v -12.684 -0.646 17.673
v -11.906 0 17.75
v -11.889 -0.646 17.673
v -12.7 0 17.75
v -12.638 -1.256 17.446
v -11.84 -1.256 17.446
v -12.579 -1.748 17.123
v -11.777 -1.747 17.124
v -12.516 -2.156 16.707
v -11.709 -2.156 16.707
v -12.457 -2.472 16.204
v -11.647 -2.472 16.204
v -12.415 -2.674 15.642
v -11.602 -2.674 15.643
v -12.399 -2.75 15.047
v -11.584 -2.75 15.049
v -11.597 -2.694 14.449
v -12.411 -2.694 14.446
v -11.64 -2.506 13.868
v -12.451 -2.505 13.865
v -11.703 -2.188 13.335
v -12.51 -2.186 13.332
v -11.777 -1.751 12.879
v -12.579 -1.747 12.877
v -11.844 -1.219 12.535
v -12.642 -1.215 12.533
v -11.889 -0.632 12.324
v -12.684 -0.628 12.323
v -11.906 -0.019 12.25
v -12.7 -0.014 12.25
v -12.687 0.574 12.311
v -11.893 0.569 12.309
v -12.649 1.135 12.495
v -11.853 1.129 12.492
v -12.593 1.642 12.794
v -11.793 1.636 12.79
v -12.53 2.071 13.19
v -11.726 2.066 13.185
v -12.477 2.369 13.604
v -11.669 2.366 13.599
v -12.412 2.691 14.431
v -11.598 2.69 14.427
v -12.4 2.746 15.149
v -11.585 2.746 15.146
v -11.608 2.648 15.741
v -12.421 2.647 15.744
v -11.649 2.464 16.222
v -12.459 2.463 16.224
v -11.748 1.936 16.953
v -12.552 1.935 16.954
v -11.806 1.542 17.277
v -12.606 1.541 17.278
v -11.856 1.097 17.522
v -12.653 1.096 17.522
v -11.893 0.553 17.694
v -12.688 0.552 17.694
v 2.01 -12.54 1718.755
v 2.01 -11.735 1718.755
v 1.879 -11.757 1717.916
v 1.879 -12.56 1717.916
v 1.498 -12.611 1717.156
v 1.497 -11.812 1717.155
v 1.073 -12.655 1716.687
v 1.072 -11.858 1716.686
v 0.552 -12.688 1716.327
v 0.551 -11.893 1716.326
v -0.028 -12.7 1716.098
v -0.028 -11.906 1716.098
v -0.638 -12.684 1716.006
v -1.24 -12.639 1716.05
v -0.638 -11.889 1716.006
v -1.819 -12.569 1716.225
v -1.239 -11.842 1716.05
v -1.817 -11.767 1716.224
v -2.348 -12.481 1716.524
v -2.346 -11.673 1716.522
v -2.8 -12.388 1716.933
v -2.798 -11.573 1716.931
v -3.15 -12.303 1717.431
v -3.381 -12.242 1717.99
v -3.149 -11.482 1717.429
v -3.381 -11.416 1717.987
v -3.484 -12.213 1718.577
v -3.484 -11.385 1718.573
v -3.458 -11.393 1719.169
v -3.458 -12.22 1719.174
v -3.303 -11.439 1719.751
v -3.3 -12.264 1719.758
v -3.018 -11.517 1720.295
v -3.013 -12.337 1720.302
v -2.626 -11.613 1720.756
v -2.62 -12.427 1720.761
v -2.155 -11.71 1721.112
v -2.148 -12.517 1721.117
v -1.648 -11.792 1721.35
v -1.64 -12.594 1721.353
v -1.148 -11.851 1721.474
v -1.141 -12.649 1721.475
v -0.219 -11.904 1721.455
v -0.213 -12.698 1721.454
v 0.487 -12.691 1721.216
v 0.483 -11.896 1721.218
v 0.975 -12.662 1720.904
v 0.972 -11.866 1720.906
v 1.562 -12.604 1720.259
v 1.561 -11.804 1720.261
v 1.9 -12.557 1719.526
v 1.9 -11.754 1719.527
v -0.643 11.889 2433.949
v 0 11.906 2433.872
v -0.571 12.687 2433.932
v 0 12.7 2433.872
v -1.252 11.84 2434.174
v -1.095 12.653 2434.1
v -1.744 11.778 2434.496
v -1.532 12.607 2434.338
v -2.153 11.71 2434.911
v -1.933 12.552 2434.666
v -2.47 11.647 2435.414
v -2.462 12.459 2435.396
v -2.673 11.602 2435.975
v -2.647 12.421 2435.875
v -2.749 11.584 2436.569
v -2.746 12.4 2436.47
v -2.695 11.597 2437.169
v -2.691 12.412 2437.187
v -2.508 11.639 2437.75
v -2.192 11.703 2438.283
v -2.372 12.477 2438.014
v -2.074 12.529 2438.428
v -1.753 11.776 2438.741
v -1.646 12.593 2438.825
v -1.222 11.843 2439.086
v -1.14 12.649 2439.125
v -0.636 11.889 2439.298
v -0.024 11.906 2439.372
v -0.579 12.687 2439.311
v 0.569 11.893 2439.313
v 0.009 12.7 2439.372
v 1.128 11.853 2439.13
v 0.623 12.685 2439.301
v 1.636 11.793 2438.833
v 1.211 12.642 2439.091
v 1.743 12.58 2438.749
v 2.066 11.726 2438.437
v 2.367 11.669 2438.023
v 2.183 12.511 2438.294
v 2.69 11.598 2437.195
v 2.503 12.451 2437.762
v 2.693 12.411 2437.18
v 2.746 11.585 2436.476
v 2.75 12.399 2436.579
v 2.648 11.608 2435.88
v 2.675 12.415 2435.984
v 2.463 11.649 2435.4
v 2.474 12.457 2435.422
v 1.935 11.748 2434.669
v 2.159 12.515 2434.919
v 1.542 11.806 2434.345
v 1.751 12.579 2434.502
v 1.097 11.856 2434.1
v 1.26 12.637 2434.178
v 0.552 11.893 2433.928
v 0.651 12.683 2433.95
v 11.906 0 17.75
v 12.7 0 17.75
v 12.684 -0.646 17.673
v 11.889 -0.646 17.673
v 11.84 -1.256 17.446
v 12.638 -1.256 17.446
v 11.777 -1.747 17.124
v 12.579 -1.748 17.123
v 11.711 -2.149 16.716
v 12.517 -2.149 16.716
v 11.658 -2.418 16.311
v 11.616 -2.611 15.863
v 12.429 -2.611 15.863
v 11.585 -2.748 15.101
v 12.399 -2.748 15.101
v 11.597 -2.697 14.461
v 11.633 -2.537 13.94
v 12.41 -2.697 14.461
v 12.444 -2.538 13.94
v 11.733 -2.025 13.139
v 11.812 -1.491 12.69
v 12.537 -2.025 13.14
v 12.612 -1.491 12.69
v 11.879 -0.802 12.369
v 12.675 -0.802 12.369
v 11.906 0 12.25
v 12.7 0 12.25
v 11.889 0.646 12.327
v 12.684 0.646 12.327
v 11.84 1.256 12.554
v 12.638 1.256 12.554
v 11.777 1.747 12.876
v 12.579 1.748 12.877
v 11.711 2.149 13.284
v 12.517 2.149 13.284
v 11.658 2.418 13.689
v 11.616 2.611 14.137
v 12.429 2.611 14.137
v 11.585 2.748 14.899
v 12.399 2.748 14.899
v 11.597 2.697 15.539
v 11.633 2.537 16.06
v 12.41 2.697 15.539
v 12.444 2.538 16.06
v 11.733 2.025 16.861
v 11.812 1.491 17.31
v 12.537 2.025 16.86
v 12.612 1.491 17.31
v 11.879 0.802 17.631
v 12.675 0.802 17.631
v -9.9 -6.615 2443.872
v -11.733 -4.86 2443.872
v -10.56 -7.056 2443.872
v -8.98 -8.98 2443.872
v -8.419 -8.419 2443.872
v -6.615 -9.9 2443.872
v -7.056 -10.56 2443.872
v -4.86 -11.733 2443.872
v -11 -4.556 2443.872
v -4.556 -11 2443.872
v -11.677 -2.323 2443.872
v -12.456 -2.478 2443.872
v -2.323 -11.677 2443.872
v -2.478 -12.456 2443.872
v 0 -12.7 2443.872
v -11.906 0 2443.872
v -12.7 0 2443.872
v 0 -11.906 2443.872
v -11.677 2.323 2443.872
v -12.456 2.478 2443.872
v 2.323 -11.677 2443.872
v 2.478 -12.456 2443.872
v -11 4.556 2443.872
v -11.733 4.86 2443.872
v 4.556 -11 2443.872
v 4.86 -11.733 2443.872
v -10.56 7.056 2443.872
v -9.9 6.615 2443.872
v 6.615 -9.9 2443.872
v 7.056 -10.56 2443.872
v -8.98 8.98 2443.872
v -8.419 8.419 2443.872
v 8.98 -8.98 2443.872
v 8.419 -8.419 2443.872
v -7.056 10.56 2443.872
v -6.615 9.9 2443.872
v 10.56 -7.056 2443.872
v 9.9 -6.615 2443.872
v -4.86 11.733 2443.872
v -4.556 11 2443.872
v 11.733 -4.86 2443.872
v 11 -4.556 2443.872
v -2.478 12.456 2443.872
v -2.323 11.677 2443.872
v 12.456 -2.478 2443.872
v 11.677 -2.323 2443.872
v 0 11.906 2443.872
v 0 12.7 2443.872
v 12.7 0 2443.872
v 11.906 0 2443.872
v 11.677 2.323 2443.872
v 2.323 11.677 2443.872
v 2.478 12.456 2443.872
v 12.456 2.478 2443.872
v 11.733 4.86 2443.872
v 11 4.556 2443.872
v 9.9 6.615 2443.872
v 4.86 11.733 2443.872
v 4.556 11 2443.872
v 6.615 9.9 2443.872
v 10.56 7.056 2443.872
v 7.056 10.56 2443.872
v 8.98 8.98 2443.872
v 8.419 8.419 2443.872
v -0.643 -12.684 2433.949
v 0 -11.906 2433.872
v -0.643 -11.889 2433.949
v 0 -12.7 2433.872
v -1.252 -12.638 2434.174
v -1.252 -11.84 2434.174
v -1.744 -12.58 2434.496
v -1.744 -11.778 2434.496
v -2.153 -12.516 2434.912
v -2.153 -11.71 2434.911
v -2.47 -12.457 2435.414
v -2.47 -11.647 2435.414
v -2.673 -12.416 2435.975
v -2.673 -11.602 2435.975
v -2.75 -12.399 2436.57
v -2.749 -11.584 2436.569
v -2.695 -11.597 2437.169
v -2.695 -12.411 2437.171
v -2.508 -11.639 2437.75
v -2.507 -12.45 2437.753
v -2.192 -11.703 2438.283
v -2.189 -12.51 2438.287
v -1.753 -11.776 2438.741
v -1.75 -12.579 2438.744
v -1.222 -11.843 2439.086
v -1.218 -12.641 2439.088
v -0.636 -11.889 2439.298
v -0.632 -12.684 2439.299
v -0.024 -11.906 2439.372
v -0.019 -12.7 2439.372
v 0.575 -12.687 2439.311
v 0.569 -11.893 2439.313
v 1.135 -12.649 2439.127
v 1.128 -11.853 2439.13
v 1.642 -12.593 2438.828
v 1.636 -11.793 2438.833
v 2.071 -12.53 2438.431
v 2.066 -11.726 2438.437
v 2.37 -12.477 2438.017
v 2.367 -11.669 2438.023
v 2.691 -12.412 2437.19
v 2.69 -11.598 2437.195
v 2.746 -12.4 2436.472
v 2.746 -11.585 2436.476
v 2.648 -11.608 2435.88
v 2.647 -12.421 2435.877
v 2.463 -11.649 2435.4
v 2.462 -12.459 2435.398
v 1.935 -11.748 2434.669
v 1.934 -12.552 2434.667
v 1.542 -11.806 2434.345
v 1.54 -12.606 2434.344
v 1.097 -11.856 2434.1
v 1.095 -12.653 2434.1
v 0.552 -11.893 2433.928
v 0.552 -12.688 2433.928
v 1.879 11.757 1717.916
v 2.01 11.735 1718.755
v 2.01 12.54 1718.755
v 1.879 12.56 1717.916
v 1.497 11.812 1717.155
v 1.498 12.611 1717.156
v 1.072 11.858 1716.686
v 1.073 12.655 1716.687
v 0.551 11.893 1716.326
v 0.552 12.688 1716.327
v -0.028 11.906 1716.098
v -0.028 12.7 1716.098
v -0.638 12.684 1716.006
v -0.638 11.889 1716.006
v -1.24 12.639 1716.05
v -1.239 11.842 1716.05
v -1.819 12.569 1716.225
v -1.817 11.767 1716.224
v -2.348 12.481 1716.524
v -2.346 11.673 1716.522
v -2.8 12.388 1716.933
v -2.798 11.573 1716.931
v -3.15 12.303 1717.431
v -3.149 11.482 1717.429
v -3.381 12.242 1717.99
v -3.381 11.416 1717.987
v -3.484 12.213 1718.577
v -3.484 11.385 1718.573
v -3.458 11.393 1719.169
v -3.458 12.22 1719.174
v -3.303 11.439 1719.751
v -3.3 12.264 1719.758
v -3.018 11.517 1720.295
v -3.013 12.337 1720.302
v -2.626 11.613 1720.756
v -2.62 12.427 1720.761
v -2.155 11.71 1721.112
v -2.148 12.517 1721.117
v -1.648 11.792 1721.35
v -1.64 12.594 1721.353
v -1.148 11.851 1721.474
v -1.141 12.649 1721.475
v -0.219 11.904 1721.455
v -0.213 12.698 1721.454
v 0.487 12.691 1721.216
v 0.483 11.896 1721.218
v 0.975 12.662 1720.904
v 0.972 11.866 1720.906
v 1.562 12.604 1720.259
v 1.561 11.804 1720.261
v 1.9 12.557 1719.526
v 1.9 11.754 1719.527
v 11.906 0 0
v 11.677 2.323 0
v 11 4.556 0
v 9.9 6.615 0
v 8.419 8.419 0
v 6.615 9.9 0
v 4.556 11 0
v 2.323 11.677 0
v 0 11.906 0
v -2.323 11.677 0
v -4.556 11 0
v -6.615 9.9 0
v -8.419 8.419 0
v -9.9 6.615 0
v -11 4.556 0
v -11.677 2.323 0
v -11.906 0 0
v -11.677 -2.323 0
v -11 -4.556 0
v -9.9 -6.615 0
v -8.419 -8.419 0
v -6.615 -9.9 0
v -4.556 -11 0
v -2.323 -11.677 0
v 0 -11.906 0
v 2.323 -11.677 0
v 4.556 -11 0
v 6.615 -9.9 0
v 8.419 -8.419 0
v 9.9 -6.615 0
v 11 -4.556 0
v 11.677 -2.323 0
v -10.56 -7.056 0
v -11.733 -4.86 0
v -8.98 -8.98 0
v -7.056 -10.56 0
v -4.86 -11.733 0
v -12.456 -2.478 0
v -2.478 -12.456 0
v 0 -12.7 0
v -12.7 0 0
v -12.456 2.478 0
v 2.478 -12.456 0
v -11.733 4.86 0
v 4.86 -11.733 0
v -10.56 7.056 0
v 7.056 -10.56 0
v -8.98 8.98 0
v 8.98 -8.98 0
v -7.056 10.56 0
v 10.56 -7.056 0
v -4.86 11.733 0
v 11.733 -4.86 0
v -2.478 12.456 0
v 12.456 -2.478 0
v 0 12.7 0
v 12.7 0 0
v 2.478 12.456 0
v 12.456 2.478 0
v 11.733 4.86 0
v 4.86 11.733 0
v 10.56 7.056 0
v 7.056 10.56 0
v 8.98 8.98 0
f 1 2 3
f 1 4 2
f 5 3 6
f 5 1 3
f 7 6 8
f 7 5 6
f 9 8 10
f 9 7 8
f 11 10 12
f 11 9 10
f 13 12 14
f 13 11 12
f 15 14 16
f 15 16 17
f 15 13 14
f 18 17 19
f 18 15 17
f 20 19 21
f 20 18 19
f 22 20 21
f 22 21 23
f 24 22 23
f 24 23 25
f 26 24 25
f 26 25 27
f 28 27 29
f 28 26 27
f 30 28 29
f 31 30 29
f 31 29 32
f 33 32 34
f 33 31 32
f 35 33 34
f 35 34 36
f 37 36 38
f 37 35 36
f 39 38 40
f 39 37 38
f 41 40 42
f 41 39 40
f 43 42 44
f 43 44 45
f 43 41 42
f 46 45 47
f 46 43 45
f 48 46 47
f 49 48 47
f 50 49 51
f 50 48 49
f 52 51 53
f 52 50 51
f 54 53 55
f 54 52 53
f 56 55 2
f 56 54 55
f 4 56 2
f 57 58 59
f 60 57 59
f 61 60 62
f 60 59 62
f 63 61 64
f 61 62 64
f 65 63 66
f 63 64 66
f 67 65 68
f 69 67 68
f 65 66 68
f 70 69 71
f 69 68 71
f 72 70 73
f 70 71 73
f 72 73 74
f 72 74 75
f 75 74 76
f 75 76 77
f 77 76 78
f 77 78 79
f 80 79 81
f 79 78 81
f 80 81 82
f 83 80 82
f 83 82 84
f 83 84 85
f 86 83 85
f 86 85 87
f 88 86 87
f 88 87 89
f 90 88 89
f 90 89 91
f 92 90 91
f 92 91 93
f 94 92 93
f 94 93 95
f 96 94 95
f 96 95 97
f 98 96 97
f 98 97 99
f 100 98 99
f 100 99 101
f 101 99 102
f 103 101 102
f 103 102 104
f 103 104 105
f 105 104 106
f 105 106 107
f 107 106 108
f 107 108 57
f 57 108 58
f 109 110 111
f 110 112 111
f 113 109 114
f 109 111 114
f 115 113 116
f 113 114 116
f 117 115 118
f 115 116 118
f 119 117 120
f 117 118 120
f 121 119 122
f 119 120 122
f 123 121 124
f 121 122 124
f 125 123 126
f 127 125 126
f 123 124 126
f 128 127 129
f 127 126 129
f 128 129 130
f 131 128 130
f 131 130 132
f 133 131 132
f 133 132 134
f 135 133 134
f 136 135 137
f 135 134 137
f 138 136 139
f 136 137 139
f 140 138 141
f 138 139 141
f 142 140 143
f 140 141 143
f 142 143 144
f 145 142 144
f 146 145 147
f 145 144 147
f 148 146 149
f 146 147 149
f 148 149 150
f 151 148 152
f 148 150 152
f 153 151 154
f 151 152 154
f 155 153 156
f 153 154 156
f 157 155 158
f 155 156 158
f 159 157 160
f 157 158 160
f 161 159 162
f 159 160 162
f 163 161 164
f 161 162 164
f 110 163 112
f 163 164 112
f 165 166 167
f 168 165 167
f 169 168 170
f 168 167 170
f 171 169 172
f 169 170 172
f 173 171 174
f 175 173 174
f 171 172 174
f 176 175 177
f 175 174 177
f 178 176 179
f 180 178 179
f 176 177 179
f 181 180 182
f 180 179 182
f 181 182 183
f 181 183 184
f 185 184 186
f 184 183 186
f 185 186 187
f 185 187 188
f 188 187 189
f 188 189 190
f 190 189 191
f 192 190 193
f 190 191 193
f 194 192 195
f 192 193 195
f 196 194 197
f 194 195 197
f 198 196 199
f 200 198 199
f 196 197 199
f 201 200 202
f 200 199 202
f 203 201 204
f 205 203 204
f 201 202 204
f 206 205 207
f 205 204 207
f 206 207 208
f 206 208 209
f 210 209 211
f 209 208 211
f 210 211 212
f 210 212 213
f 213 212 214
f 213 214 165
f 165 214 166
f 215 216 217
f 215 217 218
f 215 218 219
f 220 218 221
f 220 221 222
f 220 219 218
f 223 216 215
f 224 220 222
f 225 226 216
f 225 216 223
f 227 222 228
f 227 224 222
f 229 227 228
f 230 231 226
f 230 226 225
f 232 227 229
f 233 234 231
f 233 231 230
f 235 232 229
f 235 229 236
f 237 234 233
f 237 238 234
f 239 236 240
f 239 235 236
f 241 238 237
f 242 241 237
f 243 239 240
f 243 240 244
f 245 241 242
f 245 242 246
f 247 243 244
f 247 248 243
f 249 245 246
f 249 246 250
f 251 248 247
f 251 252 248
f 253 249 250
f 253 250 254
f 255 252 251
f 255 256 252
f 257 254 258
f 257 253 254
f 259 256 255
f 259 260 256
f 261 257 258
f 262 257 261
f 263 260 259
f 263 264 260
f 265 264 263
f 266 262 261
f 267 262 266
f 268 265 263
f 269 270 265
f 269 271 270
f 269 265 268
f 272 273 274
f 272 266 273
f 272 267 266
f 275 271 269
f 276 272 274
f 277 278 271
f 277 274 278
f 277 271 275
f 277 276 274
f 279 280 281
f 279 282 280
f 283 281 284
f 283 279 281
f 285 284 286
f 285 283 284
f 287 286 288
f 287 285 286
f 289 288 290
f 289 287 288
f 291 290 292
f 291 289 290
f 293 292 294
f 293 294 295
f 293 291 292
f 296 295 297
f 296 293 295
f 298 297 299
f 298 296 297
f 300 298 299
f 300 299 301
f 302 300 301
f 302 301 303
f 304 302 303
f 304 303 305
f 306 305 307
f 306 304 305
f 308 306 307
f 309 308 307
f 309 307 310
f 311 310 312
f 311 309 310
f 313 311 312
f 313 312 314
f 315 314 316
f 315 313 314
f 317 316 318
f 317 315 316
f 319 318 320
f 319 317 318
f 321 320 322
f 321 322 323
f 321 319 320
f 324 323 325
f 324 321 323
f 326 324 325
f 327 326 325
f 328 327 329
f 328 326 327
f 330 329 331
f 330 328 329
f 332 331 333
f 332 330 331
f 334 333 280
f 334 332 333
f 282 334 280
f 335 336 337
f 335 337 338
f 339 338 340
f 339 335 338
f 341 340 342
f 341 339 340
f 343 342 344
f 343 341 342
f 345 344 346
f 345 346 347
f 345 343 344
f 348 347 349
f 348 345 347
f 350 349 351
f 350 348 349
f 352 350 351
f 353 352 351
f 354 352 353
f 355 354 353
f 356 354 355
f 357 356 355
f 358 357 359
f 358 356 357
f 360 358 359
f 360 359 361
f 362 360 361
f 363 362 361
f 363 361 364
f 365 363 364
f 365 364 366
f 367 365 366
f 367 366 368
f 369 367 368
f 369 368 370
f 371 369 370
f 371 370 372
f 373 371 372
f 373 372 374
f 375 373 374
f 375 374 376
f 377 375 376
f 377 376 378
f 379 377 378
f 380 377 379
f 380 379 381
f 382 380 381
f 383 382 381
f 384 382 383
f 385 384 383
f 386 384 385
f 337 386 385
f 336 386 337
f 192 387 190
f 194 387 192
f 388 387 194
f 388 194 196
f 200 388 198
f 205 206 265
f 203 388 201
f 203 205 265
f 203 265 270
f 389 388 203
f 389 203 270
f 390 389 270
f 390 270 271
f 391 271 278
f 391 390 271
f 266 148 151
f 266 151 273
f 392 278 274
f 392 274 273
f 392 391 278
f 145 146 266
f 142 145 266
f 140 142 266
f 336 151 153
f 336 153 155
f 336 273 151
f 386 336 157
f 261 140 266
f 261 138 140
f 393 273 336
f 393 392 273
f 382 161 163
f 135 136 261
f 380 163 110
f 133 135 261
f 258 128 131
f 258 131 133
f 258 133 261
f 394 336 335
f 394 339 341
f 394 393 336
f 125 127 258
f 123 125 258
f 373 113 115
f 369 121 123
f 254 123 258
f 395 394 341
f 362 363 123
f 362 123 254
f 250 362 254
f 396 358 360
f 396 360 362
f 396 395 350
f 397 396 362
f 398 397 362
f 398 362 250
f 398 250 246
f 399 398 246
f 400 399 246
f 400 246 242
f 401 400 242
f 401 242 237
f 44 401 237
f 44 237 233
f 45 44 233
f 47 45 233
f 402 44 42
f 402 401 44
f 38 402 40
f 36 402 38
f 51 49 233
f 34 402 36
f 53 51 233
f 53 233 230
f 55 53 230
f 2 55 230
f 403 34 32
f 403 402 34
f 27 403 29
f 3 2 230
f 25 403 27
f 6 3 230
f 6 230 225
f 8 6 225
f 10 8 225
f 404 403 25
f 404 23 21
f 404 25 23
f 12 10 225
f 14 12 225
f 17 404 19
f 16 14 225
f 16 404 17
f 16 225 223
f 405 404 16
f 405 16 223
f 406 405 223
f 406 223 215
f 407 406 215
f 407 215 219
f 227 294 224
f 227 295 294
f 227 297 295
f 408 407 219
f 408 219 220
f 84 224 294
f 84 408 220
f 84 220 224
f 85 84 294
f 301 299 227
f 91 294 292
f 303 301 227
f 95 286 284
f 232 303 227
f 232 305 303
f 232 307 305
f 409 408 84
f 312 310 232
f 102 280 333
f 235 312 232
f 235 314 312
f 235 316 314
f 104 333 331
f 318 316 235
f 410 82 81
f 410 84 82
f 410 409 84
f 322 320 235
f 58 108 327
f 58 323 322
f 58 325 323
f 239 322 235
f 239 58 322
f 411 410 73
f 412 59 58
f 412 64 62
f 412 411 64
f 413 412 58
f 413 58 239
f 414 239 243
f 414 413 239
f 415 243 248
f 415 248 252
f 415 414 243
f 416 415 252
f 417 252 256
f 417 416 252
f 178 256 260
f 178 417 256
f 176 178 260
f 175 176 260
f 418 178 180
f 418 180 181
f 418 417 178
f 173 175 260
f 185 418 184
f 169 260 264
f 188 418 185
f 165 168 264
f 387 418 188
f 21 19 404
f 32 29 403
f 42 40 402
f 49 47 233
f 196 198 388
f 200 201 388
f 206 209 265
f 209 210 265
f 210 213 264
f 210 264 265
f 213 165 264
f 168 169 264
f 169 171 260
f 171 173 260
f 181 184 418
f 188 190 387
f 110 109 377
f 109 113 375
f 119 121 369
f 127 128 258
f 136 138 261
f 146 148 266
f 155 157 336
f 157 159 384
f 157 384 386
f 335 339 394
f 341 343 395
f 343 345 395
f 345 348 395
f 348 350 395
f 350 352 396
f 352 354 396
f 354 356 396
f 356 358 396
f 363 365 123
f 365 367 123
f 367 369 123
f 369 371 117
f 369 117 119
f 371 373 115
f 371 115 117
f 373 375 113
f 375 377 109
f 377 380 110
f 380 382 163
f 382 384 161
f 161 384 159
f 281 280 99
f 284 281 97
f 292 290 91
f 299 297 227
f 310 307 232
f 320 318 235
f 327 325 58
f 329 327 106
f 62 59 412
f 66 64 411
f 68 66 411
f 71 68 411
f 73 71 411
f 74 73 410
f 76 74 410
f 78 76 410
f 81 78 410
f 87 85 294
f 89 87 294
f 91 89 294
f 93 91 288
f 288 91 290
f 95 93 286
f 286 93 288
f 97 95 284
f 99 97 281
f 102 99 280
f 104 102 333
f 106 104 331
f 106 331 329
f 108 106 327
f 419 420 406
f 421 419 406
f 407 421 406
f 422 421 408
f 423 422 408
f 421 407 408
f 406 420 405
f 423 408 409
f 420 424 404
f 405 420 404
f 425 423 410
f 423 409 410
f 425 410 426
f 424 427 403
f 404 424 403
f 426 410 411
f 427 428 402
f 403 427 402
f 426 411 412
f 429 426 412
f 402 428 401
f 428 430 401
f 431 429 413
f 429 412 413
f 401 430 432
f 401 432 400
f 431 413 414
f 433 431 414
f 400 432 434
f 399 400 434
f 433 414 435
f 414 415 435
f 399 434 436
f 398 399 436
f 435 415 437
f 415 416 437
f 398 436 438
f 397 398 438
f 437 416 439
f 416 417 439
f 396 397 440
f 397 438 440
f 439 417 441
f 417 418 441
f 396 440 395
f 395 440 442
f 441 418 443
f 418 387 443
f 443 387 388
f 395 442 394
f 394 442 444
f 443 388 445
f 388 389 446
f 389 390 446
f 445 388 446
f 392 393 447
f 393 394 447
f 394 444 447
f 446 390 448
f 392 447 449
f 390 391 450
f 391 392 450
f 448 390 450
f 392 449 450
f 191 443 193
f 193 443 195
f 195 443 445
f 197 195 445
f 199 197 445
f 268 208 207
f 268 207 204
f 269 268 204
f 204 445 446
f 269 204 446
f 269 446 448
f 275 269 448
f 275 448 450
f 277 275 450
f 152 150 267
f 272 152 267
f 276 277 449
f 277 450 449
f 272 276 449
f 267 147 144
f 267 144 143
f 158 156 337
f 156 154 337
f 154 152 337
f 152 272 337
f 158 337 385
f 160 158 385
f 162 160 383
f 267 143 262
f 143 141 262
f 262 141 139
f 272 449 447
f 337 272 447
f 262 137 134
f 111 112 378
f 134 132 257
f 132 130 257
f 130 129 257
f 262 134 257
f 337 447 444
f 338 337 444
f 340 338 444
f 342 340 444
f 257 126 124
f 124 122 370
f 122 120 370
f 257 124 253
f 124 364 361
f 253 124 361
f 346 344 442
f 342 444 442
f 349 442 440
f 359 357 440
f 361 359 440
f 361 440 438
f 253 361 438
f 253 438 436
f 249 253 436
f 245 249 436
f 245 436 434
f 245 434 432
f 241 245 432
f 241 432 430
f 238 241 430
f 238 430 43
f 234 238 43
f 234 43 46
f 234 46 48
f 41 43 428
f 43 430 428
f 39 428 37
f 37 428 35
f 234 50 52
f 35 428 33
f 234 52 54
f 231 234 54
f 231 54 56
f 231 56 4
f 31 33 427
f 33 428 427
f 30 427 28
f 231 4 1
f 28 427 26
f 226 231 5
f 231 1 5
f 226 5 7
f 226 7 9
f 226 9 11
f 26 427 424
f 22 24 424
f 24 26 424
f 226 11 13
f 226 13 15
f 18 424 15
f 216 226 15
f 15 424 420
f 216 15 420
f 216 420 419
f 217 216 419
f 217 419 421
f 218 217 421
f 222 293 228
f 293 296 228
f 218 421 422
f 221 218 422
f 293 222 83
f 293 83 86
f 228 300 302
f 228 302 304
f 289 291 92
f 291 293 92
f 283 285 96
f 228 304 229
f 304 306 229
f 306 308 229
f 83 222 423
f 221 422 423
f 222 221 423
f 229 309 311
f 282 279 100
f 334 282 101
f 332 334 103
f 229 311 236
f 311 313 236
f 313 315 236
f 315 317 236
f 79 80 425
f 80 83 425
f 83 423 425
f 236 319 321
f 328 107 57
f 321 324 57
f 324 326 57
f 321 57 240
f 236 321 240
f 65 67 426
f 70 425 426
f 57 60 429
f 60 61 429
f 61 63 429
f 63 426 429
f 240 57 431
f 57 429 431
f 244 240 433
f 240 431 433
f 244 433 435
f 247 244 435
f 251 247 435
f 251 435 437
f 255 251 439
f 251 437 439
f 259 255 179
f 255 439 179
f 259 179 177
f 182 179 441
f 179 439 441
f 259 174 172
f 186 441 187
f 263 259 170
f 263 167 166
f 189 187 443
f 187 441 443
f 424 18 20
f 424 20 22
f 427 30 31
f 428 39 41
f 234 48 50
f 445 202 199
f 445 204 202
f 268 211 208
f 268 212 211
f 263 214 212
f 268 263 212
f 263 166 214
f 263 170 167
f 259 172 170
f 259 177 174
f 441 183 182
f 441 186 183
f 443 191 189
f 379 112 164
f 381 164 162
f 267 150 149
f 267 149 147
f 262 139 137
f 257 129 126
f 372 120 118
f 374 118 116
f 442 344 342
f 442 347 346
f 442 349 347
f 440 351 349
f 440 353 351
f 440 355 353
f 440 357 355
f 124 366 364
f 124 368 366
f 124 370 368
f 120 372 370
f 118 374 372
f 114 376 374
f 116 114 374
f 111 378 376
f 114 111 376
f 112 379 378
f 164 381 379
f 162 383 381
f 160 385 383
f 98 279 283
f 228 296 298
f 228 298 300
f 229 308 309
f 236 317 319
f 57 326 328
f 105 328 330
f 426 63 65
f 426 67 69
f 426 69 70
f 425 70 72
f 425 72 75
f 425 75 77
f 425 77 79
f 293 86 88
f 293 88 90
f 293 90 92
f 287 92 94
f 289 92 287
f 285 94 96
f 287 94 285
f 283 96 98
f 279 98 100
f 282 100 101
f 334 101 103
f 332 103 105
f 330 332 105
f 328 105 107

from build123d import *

# Parameters (mm, degrees)
SKETCH1_R               = 12.7
SKETCH1_R_2             = 11.90625
BOSS_EXTRUDE1_DEPTH     = 2443.872227937
SKETCH4_W               = 2.75
SKETCH4_H               = 12.7
SKETCH12_W              = 2.75
SKETCH12_H              = 12.7
SKETCH13_R              = 2.750000003
CUT_EXTRUDE1_DEPTH      = 13.7000001
CUT_EXTRUDE1_DEPTH_BACK = 13.7000001


with BuildPart() as part:
    # Sketch1 → Boss-Extrude1 (new body)
    with BuildSketch(Plane.XY):
        Circle(SKETCH1_R)
        Circle(SKETCH1_R_2, mode=Mode.SUBTRACT)
    extrude(amount=BOSS_EXTRUDE1_DEPTH)

    # Sketch4 → M5 Clearance Hole1 (revolve, cut)
    with BuildSketch(Plane(origin=(0, 0, 2436.622227937), x_dir=(0, 0, -1), z_dir=(1, 0, 0))):
        with Locations((1.375, 6.35)):
            Rectangle(SKETCH4_W, SKETCH4_H)
    m5_clearance_hole1 = revolve(axis=Axis((0, -6.35, 2436.622227937), (0, 1, 0)), mode=Mode.SUBTRACT)

    # Mirror1: M5 Clearance Hole1 across plane
    add(m5_clearance_hole1.mirror(Plane.ZX), mode=Mode.SUBTRACT)

    # Sketch12 → M5 Clearance Hole3 (revolve, cut)
    with BuildSketch(Plane(origin=(0, 0, 15), x_dir=(0, 0, 1), z_dir=(0, 1, 0))):
        with Locations((1.375, 6.35)):
            Rectangle(SKETCH12_W, SKETCH12_H)
    m5_clearance_hole3 = revolve(axis=Axis((-6.35, 0, 15), (1, 0, 0)), mode=Mode.SUBTRACT)

    # Mirror3: M5 Clearance Hole3 across plane
    add(m5_clearance_hole3.mirror(Plane(origin=(0, 0, 0), x_dir=(0, 0, 1), z_dir=(1, 0, 0))), mode=Mode.SUBTRACT)

    # Sketch13 → Cut-Extrude1 (cut, two sides)
    with BuildSketch(Plane(origin=(0, 0, 0), x_dir=(1, 0, 0), z_dir=(0, 1, 0))) as cut_extrude1_sk:
        with Locations((-0.739798723, -1718.754532743)):
            Circle(SKETCH13_R)
    extrude(amount=CUT_EXTRUDE1_DEPTH, mode=Mode.SUBTRACT)
    extrude(cut_extrude1_sk.sketch, amount=-CUT_EXTRUDE1_DEPTH_BACK, mode=Mode.SUBTRACT)


solid = part.part
